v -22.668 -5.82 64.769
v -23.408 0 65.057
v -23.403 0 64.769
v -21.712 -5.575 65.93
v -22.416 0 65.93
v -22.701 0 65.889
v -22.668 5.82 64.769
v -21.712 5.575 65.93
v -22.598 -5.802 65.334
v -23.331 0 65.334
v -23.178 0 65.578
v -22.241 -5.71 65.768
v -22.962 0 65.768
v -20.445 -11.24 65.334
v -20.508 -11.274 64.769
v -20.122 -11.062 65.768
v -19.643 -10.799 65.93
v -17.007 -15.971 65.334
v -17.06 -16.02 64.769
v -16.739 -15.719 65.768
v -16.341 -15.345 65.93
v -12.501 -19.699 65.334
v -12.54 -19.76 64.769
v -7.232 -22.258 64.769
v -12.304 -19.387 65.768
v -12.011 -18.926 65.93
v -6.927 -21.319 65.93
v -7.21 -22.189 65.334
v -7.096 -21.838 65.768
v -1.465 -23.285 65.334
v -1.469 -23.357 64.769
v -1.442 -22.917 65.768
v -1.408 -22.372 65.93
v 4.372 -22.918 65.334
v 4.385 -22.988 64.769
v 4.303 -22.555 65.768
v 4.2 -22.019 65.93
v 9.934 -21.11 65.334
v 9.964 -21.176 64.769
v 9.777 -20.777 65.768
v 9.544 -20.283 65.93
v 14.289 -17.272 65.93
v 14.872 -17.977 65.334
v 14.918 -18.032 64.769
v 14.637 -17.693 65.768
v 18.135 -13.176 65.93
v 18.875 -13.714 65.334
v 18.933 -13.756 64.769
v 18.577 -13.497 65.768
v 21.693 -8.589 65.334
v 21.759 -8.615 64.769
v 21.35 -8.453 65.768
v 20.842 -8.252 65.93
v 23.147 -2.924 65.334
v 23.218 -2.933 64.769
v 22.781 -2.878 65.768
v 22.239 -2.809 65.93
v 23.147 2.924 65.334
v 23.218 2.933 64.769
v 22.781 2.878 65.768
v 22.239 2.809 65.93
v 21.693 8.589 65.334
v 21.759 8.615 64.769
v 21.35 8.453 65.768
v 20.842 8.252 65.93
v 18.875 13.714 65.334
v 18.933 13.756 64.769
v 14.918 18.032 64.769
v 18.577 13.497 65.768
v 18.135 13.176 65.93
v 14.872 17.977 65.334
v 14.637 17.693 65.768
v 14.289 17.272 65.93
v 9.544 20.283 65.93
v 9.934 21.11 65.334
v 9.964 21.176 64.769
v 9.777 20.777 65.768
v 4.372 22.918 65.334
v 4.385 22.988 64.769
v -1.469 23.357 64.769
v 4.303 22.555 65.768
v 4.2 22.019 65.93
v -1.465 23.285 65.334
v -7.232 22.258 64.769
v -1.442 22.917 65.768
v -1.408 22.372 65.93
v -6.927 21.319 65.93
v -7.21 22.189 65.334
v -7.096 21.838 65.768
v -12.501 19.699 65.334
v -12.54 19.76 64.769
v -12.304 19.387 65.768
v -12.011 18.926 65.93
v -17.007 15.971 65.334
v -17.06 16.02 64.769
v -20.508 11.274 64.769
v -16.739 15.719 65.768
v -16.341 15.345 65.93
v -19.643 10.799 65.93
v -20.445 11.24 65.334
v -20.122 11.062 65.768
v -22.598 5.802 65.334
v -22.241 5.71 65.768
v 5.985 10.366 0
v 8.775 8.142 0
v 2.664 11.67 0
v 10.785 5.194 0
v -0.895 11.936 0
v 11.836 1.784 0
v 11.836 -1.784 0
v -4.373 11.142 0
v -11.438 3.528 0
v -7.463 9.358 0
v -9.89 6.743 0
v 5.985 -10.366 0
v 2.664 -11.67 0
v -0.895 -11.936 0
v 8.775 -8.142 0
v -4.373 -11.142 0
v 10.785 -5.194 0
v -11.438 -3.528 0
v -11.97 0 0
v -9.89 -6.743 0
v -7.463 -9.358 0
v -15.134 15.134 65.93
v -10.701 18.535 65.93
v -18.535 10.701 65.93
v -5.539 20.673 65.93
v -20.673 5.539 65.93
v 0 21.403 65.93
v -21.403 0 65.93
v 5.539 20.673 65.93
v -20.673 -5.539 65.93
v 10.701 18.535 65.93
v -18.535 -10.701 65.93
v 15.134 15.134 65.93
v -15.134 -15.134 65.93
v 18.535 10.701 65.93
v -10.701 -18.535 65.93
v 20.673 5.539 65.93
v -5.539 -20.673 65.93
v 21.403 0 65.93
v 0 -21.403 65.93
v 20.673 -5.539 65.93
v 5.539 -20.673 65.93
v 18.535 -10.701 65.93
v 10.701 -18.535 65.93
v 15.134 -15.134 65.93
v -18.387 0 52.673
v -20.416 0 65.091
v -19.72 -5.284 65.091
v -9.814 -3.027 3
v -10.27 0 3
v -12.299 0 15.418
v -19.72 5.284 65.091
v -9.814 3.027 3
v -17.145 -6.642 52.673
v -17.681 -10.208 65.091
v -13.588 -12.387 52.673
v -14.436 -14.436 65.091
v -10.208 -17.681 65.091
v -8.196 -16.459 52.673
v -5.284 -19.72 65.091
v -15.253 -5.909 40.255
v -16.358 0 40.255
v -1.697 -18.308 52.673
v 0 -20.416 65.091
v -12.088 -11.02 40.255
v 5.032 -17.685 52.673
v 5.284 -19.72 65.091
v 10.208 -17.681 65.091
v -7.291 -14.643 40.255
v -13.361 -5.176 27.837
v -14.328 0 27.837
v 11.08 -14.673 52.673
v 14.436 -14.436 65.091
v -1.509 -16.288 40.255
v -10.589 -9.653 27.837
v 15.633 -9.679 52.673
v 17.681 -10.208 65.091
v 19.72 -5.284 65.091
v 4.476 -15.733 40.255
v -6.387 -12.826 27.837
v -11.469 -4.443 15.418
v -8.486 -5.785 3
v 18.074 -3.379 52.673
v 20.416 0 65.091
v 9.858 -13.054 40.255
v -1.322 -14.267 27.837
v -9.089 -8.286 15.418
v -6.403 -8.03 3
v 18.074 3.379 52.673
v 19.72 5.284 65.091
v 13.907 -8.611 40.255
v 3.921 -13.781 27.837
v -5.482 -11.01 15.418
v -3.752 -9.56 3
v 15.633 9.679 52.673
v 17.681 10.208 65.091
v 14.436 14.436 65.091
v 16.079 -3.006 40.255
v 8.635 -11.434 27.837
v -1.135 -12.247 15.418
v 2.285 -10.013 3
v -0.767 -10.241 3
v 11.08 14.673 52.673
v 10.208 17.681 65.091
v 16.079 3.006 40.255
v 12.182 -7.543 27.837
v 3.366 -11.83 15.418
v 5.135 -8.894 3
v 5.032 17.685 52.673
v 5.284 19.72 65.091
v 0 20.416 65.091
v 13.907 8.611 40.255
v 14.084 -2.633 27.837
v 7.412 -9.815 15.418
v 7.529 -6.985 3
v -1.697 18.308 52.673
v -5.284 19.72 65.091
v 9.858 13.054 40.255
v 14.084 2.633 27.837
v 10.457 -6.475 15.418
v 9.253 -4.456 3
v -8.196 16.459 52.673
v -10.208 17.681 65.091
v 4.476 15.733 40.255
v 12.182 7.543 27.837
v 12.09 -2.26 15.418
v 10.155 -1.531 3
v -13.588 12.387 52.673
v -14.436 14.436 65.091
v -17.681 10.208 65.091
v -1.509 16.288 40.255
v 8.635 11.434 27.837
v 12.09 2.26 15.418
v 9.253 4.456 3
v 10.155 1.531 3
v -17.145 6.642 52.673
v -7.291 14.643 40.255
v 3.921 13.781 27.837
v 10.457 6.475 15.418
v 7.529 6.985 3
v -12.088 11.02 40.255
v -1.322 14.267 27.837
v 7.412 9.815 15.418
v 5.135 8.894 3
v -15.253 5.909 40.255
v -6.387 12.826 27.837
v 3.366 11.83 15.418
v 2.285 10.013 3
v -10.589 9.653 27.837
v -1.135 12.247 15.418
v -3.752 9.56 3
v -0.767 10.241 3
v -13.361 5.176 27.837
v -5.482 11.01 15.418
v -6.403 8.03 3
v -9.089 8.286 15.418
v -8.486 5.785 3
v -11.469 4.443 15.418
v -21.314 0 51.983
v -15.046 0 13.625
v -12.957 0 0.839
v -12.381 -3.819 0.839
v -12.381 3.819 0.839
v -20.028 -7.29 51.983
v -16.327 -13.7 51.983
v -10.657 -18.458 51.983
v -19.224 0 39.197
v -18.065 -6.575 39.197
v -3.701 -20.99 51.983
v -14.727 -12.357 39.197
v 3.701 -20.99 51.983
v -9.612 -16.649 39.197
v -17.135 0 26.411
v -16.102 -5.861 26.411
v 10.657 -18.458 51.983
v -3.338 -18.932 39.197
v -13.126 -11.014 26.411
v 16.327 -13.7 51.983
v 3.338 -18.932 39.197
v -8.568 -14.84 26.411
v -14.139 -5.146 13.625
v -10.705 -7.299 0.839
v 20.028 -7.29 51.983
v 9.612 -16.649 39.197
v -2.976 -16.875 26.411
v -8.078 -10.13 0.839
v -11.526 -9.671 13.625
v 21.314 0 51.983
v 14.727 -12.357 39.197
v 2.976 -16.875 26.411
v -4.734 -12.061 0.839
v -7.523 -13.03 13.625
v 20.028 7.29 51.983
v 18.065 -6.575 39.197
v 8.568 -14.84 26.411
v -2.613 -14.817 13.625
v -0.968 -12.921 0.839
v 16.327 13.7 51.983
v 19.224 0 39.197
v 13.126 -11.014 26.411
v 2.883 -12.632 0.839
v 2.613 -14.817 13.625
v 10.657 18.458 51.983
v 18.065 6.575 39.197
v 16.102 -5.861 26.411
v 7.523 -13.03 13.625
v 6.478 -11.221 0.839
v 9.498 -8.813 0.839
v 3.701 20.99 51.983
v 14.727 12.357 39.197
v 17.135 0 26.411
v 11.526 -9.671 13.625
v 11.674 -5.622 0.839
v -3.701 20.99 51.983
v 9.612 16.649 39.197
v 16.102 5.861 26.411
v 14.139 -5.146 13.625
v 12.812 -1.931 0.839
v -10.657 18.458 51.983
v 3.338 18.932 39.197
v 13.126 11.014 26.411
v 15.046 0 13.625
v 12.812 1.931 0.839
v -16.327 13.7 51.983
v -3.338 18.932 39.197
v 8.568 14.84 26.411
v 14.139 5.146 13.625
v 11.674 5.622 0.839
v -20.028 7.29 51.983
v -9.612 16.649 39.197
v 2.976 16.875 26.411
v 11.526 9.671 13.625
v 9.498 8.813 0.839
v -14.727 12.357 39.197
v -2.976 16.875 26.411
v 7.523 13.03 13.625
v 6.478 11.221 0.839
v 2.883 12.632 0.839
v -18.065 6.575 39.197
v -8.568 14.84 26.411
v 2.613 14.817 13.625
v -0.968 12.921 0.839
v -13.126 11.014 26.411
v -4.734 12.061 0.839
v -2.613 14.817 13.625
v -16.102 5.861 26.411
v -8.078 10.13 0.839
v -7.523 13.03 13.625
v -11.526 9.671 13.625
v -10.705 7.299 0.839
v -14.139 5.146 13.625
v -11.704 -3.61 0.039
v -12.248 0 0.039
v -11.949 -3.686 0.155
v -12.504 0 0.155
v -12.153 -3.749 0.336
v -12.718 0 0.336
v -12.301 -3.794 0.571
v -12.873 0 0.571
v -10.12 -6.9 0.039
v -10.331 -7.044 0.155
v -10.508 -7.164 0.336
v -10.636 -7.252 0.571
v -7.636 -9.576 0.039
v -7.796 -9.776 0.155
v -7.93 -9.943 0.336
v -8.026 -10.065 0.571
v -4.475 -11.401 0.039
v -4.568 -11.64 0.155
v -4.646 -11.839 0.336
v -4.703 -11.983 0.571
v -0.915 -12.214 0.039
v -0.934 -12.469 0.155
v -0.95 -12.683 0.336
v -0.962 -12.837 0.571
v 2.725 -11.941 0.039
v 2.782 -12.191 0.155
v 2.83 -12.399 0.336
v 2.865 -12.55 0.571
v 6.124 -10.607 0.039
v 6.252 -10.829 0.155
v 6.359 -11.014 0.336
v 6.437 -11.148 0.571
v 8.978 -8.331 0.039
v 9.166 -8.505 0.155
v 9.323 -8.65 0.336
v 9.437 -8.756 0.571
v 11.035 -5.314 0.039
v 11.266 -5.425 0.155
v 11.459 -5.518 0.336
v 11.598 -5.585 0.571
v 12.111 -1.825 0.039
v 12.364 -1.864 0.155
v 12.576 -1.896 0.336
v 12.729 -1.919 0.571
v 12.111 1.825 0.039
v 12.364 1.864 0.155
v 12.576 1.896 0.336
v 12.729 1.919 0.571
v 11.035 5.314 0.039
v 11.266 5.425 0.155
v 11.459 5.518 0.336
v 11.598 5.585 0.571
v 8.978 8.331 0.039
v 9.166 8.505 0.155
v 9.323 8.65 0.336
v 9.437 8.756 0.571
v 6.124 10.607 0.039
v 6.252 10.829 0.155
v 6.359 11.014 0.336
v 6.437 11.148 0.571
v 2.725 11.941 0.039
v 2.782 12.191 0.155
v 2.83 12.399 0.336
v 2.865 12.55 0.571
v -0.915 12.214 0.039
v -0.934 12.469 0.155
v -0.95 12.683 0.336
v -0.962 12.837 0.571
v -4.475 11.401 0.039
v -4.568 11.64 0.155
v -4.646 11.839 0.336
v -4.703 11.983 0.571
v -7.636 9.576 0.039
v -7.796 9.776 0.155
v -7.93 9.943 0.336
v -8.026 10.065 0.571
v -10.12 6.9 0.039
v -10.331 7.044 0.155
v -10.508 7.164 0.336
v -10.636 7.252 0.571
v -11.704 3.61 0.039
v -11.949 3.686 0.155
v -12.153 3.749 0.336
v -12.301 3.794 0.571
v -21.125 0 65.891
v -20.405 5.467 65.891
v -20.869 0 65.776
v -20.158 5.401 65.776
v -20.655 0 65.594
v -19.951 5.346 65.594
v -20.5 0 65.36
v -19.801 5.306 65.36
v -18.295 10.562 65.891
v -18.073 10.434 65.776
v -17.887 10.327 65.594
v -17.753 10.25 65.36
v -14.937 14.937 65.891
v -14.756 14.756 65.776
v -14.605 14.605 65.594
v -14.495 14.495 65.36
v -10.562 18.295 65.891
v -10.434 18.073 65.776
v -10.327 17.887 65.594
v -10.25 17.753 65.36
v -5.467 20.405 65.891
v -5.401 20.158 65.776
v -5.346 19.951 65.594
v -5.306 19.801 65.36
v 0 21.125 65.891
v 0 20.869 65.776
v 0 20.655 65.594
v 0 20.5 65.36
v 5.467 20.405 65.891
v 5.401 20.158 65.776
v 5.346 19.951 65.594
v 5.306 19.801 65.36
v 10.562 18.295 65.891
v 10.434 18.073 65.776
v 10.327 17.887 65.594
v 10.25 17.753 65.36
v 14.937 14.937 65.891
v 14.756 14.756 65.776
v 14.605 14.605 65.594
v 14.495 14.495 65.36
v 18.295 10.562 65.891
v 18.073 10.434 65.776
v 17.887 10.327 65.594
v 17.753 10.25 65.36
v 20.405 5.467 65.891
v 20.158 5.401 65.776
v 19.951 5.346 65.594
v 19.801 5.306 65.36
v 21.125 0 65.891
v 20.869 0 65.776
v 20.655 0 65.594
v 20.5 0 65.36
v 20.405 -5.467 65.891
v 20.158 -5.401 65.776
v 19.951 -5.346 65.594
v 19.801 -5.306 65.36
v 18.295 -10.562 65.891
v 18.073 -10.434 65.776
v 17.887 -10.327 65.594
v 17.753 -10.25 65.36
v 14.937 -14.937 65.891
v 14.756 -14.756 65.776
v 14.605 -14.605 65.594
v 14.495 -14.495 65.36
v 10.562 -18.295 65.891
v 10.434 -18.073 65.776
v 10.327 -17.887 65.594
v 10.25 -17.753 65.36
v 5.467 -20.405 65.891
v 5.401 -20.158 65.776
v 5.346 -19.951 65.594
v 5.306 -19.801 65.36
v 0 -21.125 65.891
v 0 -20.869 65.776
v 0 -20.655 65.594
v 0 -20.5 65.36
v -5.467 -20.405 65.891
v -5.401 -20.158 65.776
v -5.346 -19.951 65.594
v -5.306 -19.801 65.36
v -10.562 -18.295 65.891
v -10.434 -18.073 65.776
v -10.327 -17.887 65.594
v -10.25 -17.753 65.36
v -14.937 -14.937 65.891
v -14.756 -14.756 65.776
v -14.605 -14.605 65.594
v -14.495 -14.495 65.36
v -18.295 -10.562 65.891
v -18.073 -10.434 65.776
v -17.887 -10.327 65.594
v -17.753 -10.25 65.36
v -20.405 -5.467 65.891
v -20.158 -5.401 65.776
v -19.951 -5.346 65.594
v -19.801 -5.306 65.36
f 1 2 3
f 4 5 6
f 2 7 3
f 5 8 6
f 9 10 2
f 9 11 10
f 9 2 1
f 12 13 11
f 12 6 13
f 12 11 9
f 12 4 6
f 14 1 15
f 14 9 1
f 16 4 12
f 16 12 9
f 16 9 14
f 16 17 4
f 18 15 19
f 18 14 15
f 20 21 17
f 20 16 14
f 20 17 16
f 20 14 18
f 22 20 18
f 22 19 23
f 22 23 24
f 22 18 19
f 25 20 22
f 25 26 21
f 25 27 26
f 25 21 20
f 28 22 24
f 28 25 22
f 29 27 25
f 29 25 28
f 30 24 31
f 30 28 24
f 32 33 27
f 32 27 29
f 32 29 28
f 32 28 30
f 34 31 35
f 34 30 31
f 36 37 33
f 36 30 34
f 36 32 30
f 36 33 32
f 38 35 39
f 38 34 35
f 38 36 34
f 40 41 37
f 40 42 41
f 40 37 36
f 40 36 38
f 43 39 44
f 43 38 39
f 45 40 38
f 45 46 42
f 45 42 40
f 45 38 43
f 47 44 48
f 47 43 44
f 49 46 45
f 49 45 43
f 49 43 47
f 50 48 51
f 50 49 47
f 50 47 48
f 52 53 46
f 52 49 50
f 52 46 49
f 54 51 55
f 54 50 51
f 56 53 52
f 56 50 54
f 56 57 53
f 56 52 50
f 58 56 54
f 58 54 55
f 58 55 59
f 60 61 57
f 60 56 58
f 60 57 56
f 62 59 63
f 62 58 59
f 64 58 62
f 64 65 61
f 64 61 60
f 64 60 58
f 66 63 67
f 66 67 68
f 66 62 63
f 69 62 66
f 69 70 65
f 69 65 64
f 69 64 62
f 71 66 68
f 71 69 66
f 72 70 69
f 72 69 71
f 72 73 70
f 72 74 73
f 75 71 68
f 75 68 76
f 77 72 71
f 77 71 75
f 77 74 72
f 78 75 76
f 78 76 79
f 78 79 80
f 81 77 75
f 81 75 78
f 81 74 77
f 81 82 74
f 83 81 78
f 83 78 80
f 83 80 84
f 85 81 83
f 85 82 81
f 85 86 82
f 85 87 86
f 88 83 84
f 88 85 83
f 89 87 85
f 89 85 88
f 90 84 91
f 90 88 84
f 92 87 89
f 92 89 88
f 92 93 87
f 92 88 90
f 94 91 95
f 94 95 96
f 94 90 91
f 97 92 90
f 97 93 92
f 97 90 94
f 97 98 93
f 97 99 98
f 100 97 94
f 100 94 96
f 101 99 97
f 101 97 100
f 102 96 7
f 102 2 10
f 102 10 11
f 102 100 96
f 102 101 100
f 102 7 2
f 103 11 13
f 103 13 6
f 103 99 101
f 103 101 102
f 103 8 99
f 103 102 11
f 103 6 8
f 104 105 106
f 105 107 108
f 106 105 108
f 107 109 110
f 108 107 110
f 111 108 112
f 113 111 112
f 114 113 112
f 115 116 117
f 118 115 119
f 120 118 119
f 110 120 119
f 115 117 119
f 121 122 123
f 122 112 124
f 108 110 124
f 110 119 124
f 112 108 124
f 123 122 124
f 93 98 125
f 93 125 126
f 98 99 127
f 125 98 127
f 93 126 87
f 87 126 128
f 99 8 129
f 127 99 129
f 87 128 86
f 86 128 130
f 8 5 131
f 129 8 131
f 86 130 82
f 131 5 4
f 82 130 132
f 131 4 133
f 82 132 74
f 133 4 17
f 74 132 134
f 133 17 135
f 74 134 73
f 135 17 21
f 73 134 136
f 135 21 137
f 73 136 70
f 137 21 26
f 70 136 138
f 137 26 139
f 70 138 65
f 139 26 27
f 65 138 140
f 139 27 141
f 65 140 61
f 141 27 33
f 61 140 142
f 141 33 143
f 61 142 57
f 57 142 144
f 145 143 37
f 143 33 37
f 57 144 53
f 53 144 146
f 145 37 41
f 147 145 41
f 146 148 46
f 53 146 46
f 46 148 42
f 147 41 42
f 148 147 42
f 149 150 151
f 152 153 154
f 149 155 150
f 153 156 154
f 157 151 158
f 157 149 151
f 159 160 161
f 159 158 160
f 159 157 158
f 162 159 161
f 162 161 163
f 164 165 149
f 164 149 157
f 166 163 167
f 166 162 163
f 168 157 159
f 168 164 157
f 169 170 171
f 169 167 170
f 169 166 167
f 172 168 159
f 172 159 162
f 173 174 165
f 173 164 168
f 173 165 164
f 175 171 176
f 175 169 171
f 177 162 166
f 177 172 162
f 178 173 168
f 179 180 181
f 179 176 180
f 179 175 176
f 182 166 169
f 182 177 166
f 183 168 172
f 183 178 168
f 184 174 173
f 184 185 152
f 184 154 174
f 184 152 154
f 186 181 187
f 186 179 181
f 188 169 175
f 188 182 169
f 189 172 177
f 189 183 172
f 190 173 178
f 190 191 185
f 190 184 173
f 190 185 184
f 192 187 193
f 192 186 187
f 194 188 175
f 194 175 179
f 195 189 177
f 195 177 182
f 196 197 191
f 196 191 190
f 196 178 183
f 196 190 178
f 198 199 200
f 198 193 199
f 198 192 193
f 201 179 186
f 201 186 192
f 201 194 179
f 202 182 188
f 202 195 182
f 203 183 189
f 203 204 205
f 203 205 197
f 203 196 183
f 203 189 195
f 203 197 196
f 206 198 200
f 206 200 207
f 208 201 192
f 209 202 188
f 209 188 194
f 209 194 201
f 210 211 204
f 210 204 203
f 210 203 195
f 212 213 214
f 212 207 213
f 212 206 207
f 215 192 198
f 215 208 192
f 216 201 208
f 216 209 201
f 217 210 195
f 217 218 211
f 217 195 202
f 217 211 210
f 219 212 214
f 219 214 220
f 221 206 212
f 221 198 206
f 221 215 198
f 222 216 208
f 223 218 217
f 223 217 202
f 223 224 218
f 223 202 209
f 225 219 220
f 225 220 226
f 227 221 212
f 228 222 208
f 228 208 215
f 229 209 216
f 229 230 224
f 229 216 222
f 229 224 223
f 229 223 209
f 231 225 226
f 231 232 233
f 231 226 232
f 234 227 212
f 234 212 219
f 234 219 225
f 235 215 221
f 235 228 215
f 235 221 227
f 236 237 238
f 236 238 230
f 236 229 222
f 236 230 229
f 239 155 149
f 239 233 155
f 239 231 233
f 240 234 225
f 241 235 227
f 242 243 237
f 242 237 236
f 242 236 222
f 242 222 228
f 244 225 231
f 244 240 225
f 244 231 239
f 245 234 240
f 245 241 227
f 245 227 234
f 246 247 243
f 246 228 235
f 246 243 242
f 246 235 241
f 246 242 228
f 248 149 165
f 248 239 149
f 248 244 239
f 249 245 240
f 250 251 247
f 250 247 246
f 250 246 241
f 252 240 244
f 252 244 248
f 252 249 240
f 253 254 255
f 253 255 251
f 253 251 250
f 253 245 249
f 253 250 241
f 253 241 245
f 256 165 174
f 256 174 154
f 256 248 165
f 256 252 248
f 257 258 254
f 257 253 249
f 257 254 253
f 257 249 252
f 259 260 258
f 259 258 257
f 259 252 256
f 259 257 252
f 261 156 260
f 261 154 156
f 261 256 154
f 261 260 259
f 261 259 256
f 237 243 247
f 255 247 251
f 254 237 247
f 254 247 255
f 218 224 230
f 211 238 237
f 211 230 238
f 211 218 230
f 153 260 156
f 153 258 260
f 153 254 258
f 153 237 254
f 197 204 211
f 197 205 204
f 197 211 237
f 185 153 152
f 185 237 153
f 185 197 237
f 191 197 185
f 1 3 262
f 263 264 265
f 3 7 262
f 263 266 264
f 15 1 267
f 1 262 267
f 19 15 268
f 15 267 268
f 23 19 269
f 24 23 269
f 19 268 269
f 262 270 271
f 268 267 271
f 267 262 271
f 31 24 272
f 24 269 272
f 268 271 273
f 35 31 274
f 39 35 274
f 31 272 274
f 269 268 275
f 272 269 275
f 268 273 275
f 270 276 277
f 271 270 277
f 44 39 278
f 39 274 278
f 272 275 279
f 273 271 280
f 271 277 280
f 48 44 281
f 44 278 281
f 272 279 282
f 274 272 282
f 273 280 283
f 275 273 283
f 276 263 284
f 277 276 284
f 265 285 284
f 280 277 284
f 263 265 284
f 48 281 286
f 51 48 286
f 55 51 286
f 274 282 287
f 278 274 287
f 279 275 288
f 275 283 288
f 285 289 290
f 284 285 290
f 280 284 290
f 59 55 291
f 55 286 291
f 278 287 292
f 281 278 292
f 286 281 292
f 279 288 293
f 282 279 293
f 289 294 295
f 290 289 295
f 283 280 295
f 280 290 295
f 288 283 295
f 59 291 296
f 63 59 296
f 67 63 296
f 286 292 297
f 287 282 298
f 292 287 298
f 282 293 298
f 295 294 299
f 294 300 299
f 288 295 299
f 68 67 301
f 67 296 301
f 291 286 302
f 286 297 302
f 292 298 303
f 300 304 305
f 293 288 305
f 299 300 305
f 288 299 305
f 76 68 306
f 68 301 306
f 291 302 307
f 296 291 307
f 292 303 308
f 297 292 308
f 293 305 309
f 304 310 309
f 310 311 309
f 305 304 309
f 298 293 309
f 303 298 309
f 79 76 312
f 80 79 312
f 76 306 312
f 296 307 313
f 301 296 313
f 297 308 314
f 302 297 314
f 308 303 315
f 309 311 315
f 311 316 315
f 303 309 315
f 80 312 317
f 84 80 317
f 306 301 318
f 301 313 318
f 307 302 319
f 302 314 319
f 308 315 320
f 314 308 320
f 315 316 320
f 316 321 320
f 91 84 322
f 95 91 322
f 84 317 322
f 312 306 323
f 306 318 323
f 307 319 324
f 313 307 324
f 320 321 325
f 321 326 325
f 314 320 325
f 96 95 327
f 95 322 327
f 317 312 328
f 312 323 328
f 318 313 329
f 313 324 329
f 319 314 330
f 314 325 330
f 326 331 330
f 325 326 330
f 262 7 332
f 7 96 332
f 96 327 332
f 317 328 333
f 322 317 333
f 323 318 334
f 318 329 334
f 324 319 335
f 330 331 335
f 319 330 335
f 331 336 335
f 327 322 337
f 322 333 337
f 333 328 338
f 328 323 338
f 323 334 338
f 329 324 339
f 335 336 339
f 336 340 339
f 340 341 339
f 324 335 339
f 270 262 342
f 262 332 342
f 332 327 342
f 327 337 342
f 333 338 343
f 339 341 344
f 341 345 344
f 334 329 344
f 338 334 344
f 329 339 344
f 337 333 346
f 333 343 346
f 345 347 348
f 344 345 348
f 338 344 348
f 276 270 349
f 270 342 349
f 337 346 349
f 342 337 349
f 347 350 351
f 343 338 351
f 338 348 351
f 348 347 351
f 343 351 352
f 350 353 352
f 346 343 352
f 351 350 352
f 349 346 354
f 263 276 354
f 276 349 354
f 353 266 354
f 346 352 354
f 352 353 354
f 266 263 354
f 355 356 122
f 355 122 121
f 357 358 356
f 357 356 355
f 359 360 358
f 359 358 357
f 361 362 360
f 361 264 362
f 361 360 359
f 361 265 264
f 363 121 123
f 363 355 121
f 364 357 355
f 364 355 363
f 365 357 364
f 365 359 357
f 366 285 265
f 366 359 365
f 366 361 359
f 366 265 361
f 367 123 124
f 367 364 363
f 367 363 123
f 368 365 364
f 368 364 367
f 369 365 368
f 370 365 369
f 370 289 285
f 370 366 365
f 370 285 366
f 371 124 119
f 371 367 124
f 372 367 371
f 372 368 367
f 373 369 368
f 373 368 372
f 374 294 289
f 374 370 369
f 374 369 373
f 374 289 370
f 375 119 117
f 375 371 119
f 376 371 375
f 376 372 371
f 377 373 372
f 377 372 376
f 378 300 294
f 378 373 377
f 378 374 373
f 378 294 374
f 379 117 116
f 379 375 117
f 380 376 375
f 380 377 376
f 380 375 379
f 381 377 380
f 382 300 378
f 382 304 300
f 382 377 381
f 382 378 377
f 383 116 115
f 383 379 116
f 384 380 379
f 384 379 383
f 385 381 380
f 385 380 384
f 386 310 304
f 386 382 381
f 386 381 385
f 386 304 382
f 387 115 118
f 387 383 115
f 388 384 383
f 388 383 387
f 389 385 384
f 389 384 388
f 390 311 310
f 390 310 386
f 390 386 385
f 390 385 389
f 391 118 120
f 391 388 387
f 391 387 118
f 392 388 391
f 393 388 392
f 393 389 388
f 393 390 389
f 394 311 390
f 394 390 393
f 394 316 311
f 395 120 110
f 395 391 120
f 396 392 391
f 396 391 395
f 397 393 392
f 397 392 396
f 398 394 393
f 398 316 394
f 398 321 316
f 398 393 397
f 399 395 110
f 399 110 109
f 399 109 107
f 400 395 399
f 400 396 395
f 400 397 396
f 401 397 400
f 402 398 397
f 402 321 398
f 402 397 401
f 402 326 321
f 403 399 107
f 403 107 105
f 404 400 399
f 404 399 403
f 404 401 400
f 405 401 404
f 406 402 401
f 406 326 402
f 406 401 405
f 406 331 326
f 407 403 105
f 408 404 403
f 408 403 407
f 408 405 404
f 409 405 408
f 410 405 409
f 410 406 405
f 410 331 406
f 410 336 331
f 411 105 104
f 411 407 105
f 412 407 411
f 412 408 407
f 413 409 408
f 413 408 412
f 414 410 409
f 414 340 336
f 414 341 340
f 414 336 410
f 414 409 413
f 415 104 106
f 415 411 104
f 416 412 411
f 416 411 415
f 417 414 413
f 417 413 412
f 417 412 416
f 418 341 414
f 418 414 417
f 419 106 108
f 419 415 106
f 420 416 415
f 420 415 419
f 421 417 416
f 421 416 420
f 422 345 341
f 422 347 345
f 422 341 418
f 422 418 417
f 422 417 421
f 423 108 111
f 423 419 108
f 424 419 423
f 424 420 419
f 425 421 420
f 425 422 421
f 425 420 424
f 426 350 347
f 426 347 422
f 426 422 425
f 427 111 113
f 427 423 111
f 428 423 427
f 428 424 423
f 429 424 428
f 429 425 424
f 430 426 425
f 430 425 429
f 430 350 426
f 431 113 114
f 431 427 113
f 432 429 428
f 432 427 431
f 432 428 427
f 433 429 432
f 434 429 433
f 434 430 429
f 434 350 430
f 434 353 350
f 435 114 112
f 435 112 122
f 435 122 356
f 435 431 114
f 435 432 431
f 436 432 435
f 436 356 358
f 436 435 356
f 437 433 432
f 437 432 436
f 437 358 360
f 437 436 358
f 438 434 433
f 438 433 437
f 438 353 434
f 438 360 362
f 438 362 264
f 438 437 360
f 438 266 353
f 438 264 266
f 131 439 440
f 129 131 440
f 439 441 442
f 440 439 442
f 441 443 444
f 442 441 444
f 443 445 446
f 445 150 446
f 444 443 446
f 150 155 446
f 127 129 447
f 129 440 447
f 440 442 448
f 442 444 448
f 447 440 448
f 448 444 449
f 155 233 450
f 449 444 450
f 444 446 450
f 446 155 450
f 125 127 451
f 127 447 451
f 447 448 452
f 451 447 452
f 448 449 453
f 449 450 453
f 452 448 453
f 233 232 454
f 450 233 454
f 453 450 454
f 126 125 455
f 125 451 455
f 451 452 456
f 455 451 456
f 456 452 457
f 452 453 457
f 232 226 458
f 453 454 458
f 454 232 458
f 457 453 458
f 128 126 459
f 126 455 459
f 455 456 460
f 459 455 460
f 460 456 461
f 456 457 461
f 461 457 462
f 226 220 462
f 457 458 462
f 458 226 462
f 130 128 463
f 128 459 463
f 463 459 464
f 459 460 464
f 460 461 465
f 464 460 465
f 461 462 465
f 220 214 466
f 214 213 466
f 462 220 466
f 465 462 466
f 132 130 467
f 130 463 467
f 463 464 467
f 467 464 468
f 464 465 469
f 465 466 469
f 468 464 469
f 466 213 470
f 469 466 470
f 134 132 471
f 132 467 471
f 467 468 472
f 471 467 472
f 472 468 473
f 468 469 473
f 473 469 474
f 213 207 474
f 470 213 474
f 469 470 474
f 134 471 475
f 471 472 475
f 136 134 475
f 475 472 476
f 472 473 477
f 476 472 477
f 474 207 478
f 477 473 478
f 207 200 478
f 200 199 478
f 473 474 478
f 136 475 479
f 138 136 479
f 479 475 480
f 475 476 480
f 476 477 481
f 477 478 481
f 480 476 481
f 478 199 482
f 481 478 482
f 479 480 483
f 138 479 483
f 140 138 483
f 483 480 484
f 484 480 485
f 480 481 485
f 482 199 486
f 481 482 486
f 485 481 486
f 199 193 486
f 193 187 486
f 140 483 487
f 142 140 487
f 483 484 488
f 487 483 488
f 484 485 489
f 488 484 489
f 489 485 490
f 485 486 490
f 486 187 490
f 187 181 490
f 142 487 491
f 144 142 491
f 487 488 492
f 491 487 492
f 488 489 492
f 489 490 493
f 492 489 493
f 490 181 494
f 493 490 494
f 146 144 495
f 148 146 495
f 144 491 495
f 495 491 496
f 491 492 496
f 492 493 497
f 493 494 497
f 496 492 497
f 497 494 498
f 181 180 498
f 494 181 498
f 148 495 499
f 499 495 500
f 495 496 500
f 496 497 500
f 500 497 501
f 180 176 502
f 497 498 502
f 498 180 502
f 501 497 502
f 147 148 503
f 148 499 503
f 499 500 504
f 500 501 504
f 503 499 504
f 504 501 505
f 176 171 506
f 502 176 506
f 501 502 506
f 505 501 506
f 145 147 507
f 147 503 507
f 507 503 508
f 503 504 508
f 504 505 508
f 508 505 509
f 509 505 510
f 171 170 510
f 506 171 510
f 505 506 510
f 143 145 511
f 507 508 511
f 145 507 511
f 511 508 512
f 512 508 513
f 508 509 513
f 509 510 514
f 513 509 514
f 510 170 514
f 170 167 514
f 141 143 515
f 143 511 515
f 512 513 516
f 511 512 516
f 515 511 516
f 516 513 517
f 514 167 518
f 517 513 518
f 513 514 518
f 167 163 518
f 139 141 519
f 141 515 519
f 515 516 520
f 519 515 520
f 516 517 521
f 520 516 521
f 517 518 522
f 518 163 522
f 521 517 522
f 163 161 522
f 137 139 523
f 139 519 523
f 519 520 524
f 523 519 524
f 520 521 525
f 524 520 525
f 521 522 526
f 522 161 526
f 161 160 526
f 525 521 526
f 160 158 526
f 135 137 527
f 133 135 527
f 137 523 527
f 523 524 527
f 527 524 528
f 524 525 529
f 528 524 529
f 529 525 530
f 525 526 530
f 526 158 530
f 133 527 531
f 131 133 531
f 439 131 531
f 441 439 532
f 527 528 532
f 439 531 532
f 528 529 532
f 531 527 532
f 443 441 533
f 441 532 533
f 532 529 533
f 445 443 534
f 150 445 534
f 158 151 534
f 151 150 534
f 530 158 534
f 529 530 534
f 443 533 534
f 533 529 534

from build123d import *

# Parameters (mm, degrees)
F2_T = -3
F3_R = 1


with BuildPart() as f1:
    # F0 (on Front) → F1 (revolve)
    with BuildSketch(Plane.XZ):
        Polygon((-12.8197669983, 0), (0, 0), (0, 65.9302324057), (-23.5926825553, 65.9302324057), align=None)
    revolve(axis=Axis((0, 0, 32.9651162028), (0, 0, 1)))

    # F2
    f2_openings = [f1.faces().sort_by_distance(p)[0] for p in [
        (0, 0, 65.930232),
    ]]
    offset(amount=F2_T, openings=f2_openings)

    # F3
    f3_edges = [f1.edges().sort_by_distance(p)[0] for p in [
        (23.592683, 0, 65.930232),
        (20.552898, 0, 65.930232),
        (12.819767, 0, 0),
    ]]
    fillet(f3_edges, radius=F3_R)


solid = f1.part
